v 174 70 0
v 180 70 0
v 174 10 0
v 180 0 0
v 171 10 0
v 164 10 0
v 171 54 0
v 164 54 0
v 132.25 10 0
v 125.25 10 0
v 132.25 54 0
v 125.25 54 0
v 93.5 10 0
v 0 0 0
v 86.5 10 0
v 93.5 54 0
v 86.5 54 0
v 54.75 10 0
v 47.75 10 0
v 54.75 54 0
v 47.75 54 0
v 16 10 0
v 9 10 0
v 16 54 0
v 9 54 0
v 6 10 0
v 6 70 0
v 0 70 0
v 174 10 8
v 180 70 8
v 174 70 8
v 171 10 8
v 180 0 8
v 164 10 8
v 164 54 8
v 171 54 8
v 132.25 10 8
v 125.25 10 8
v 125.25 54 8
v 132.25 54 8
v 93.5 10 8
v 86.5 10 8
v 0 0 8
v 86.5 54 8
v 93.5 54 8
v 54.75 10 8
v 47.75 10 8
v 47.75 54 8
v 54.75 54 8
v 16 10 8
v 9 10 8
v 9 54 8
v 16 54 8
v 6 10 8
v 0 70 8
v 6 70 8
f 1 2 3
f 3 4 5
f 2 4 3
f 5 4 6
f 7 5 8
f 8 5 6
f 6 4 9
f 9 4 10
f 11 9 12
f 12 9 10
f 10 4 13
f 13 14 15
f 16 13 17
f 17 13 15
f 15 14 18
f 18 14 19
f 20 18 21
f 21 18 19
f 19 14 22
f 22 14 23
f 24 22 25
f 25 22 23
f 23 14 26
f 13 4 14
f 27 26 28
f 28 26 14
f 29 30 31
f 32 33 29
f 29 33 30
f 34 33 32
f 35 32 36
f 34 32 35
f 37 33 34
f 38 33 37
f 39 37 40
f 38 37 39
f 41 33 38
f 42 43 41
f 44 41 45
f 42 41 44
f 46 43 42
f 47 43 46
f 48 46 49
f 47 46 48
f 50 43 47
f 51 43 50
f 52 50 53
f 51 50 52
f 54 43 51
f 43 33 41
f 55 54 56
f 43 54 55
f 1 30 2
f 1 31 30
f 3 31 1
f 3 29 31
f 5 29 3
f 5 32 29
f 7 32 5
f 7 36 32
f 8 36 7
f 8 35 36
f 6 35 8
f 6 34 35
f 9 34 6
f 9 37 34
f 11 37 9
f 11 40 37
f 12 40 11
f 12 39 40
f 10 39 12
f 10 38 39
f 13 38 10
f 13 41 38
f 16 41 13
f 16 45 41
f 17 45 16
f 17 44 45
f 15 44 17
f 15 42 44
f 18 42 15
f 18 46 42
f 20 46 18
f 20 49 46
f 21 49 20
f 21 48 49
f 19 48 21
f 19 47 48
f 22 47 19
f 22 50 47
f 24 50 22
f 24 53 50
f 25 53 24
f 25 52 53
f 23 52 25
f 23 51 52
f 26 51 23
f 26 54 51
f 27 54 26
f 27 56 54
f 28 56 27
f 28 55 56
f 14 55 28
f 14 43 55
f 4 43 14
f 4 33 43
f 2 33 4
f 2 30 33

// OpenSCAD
$fn = 32;
// ----------------------------------------------------------------------
// Guard grille: 5 slats over a 180 x 70 mm plate
// ----------------------------------------------------------------------

// --- parameters (mm) ---
profile_height = 8;       // extrusion height
profile_points = 28;      // points of the closed outline

profile = [[0, 0], [180, 0], [180, 70], [174, 70], [174, 10], [171, 10], [171, 54], [164, 54], [164, 10], [132.25, 10], [132.25, 54], [125.25, 54], [125.25, 10], [93.5, 10], [93.5, 54], [86.5, 54], [86.5, 10], [54.75, 10], [54.75, 54], [47.75, 54], [47.75, 10], [16, 10], [16, 54], [9, 54], [9, 10], [6, 10], [6, 70], [0, 70]];  // single closed polygon, 28 points, counter clockwise

// --- the one profile operation ---
linear_extrude(height = profile_height) polygon(points = profile);
